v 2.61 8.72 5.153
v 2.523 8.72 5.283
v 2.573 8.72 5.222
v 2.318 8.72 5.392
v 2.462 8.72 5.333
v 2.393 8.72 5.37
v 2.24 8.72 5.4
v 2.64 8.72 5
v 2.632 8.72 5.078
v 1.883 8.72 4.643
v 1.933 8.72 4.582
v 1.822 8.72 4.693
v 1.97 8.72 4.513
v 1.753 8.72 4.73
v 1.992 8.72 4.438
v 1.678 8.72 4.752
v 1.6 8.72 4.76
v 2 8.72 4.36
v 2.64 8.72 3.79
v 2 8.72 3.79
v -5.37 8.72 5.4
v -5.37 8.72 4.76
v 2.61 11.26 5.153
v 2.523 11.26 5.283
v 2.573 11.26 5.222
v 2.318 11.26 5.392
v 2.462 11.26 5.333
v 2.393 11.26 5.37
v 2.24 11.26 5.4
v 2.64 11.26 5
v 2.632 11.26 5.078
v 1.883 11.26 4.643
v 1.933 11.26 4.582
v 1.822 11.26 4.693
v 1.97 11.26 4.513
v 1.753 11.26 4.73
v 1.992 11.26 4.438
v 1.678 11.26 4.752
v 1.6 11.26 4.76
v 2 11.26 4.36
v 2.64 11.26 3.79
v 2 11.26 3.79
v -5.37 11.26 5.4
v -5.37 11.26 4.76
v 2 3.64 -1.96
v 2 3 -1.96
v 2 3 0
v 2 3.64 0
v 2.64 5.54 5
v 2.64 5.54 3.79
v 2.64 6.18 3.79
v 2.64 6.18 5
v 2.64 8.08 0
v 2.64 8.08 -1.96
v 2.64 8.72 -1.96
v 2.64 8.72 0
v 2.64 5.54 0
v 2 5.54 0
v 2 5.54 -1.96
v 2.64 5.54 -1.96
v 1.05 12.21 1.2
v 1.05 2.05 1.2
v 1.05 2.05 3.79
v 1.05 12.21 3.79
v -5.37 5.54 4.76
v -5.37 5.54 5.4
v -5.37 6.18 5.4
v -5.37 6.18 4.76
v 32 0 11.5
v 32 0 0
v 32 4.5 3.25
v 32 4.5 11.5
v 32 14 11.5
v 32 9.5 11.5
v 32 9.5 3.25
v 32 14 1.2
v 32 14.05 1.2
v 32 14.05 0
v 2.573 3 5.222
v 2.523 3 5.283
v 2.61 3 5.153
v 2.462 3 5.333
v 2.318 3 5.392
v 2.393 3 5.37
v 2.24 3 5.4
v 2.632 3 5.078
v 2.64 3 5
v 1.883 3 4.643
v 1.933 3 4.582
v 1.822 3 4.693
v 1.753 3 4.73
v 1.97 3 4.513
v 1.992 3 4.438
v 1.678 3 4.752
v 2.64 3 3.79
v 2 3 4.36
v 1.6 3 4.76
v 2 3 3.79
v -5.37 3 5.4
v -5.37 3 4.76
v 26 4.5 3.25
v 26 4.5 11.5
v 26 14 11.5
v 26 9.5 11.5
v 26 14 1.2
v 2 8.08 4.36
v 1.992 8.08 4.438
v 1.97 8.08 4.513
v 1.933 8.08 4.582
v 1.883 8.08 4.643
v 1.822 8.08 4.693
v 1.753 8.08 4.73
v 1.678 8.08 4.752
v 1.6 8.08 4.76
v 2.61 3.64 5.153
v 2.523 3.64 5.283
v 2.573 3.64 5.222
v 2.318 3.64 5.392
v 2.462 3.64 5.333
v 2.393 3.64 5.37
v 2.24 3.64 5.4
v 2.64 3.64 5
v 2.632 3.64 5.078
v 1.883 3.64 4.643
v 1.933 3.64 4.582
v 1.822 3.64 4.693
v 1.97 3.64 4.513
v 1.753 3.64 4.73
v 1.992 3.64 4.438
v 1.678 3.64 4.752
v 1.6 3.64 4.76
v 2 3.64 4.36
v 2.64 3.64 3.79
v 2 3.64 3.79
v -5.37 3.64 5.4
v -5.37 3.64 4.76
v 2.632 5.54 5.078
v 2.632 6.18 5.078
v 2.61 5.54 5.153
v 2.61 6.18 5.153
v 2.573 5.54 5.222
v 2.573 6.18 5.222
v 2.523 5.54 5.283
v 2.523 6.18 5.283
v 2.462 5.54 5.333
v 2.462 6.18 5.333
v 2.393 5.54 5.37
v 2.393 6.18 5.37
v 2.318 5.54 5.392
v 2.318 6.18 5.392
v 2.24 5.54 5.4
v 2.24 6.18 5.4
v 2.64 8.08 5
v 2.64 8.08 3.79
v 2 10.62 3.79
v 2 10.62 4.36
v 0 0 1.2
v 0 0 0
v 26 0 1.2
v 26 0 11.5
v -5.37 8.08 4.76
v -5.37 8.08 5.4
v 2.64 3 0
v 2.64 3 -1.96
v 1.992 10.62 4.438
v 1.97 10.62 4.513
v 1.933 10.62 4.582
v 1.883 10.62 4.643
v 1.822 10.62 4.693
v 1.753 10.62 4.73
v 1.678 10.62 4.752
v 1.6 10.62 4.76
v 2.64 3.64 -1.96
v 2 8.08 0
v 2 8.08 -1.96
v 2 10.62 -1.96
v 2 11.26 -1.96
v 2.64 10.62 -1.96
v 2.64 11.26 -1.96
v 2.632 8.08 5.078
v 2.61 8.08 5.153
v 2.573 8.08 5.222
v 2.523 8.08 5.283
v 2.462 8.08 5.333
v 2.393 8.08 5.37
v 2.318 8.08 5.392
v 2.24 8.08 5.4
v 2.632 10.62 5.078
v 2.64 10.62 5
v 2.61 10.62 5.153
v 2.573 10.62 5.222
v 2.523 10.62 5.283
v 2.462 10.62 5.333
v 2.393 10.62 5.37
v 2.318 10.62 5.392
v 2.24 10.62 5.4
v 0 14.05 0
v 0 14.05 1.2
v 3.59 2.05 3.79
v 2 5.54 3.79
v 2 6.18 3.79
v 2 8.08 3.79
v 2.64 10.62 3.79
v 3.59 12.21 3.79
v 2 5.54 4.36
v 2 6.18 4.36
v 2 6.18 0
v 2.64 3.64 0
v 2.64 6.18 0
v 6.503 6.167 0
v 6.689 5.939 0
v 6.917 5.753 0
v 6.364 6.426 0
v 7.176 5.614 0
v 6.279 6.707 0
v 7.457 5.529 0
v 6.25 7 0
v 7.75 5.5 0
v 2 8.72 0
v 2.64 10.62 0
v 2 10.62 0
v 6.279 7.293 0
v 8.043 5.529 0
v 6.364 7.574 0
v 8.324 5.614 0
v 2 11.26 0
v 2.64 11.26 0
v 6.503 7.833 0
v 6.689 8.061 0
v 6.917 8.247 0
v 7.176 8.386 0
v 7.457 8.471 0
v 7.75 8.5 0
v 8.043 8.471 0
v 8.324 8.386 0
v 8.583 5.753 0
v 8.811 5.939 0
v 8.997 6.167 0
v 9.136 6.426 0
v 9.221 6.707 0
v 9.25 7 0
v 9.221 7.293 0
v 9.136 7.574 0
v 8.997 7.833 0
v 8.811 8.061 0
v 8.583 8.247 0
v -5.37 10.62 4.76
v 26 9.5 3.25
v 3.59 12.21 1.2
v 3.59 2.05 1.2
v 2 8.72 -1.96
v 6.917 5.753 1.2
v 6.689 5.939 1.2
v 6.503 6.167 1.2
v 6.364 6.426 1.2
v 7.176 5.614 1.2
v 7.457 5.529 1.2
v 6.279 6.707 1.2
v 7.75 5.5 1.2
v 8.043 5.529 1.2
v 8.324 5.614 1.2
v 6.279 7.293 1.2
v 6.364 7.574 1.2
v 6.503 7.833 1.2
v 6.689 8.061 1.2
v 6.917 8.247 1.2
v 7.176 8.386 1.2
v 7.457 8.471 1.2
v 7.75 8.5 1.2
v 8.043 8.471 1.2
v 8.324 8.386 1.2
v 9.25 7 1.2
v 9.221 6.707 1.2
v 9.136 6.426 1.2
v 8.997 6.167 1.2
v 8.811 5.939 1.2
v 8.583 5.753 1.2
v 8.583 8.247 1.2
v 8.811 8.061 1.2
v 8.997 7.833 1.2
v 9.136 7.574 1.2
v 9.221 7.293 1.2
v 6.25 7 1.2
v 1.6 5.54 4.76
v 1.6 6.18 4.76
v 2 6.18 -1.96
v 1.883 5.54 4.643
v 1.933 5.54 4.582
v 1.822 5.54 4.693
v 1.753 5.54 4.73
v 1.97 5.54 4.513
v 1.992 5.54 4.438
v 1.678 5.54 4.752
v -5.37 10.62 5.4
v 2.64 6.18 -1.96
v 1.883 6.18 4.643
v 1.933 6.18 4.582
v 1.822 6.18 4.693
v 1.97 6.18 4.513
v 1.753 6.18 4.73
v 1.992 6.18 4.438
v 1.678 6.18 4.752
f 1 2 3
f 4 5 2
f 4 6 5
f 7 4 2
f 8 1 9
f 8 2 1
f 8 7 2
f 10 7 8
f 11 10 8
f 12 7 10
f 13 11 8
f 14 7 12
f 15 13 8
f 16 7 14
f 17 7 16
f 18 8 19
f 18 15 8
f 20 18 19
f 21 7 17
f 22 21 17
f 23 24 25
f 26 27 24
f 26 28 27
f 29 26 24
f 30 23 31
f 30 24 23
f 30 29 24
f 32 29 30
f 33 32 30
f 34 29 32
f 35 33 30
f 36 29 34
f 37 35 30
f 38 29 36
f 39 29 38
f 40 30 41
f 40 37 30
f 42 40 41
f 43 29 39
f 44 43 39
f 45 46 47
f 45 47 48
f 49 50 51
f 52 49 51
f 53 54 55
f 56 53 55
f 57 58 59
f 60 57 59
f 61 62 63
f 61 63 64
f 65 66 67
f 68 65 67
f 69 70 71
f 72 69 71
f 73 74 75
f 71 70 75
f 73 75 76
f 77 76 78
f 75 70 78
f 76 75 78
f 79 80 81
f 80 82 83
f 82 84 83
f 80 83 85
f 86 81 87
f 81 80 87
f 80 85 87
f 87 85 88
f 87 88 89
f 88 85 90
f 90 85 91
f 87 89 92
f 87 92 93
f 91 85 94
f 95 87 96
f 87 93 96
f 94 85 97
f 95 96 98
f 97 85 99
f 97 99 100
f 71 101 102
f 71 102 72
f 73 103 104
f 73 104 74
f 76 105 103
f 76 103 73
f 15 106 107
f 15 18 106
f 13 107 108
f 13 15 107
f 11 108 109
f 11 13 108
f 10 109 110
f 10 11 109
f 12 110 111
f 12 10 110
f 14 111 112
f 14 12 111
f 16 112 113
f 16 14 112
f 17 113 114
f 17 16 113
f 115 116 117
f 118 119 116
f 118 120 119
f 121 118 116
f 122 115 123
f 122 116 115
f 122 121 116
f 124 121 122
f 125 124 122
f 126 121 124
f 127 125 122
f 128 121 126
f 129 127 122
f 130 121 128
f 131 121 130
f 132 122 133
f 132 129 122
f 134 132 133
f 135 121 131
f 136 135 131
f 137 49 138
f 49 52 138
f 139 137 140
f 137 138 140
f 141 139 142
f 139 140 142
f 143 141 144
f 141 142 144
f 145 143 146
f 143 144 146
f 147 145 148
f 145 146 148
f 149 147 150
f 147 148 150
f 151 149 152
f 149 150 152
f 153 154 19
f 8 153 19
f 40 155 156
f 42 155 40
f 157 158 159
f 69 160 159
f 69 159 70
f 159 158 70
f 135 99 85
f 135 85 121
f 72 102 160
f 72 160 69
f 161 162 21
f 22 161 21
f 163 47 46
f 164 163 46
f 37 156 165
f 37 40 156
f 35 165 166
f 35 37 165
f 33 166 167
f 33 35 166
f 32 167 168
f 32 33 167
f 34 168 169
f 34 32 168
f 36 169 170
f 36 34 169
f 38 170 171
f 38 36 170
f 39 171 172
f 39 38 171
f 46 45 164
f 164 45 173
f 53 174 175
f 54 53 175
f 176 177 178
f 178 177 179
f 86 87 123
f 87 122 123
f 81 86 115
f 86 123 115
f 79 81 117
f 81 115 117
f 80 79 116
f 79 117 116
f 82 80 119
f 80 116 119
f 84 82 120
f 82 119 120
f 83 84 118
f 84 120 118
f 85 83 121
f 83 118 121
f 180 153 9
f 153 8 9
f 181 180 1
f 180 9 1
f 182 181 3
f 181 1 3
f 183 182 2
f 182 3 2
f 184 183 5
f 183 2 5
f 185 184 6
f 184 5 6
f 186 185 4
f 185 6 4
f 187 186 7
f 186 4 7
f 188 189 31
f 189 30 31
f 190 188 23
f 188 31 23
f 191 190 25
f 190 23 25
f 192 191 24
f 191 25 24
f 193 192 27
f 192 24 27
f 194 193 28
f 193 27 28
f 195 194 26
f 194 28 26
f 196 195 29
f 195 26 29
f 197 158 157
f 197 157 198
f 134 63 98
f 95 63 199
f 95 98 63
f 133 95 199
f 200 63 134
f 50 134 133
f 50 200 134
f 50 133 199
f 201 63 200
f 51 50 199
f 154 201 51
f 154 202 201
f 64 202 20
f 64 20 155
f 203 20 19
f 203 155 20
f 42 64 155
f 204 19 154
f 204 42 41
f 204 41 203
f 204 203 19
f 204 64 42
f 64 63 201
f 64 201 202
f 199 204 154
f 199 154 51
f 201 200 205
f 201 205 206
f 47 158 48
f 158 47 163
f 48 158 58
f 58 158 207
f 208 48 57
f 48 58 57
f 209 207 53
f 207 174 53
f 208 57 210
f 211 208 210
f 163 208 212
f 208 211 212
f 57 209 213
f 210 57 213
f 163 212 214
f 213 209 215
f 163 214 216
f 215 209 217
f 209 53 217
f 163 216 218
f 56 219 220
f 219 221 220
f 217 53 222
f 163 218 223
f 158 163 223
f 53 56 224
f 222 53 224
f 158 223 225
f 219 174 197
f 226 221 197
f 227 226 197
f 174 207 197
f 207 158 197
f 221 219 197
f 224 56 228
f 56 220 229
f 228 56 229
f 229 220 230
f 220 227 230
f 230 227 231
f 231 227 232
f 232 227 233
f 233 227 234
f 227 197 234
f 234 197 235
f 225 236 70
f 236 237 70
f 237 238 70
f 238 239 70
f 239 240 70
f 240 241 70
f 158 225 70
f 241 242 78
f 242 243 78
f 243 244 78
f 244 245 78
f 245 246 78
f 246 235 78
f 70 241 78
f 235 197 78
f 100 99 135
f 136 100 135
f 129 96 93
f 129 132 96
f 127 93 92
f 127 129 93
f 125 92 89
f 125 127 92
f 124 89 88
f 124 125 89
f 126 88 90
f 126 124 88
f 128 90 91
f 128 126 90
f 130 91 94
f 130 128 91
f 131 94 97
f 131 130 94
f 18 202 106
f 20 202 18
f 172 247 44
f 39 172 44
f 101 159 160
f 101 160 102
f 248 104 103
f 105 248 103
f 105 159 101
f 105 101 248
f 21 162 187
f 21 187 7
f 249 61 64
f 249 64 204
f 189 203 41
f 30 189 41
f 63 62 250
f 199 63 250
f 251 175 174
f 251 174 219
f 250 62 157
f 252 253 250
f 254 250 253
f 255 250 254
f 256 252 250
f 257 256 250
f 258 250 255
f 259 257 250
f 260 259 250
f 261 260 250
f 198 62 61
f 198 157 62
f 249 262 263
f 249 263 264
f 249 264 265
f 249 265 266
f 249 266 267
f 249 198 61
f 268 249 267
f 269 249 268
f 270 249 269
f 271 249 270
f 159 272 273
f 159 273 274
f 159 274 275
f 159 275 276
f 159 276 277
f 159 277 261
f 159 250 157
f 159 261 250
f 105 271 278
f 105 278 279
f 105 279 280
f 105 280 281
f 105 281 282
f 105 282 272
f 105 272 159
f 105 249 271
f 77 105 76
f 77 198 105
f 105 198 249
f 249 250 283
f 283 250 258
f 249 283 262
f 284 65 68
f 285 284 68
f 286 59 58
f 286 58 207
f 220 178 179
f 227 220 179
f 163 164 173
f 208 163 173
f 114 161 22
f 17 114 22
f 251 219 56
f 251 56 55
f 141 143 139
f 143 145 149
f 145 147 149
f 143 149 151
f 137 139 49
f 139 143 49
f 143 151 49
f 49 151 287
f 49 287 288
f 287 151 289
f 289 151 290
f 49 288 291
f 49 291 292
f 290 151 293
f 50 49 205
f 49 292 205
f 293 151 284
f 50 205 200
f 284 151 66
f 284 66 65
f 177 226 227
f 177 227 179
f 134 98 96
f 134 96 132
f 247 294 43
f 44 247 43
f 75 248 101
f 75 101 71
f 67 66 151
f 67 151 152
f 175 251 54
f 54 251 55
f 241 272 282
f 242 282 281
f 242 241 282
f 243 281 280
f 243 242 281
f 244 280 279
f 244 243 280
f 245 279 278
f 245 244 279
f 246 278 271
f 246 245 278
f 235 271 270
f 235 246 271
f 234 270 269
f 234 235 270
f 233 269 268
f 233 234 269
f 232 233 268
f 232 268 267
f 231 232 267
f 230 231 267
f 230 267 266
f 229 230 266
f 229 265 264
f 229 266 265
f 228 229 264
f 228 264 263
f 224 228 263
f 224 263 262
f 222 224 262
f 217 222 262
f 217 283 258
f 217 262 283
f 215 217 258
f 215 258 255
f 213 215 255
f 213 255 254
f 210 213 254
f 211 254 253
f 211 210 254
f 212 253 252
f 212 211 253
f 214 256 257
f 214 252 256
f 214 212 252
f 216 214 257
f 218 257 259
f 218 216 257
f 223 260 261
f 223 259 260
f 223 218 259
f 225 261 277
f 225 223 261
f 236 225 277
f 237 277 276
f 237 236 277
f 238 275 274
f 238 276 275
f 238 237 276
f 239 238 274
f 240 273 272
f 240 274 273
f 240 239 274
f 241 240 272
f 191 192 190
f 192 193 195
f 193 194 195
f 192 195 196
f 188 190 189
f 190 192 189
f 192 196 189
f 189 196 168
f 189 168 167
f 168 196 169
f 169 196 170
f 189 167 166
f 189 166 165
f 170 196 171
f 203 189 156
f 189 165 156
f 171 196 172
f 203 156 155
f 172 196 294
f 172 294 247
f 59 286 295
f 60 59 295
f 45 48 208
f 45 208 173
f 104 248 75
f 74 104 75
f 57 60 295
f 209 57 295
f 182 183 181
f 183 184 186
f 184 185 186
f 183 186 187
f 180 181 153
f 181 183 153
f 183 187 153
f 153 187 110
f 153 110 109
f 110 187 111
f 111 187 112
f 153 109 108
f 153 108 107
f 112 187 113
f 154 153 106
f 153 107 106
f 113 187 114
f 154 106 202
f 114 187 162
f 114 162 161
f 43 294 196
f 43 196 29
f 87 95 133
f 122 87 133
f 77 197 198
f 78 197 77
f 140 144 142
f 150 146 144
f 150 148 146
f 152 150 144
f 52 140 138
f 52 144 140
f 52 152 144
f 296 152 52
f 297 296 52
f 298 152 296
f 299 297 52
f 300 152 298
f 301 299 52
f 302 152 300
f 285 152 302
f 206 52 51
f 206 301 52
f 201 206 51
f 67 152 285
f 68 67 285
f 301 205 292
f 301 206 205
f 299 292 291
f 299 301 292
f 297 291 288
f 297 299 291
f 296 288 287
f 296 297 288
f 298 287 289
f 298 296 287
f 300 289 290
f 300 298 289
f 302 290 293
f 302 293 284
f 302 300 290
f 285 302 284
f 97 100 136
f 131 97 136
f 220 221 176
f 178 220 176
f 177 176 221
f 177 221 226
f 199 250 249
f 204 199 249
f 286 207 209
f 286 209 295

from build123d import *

# Parameters (mm, degrees)
CYLINDER_R         = 1.5
CYLINDER_DEPTH     = 10
BOX014_W           = 2.54
BOX014_H           = 10
BOX014_DEPTH       = 2.54
BOX013_W           = 2.53
BOX013_H           = 10
BOX013_DEPTH       = 2.53
BOX012_W           = 2.54
BOX012_H           = 10.16
BOX012_DEPTH       = 2.6
BOX011_W           = 0.64
BOX011_H           = 0.64
BOX011_DEPTH       = 9.9
BOX011_PITCH_ANGLE = 90
BOX010_W           = 0.64
BOX010_H           = 0.64
BOX010_DEPTH       = 9.9
BOX009_W           = 0.64
BOX009_H           = 0.64
BOX009_DEPTH       = 9.9
BOX009_PITCH_ANGLE = 90
BOX008_W           = 0.64
BOX008_H           = 0.64
BOX008_DEPTH       = 9.9
BOX007_W           = 0.64
BOX007_H           = 0.64
BOX007_DEPTH       = 9.9
BOX007_PITCH_ANGLE = 90
BOX006_W           = 0.64
BOX006_H           = 0.64
BOX006_DEPTH       = 9.9
BOX005_W           = 0.64
BOX005_H           = 0.64
BOX005_DEPTH       = 9.9
BOX005_PITCH_ANGLE = 90
BOX004_W           = 0.64
BOX004_H           = 0.64
BOX004_DEPTH       = 9.9
FILLET_R           = 0.4
FILLET001_R        = 0.4
FILLET002_R        = 0.4
FILLET003_R        = 0.4
FILLET004_R        = 0.4
FILLET005_R        = 0.4
FILLET006_R        = 0.4
FILLET007_R        = 0.4
BOX003_W           = 6
BOX003_H           = 5
BOX003_DEPTH       = 3.25
BOX002_W           = 6
BOX002_H           = 4.5
BOX002_DEPTH       = 11.5
BOX001_W           = 6
BOX001_H           = 4.5
BOX001_DEPTH       = 11.5
BOX_W              = 32
BOX_H              = 14.05
BOX_DEPTH          = 1.2


with BuildPart() as cylinder:
    # Cylinder → Cylinder (new body)
    with BuildSketch(Plane(origin=(7.75, 7, 0), x_dir=(1, 0, 0), z_dir=(0, 0, 1))):
        Circle(CYLINDER_R)
    extrude(amount=CYLINDER_DEPTH)


with BuildPart() as box014:
    # Box014 → Box014 (new body)
    with BuildSketch(Plane(origin=(-0.5, -1, 0), x_dir=(1, 0, 0), z_dir=(0, 0, 1))):
        with Locations((1.27, 5)):
            Rectangle(BOX014_W, BOX014_H)
    extrude(amount=BOX014_DEPTH)


with BuildPart() as box013:
    # Box013 → Box013 (new body)
    with BuildSketch(Plane(origin=(-9.9, -1, 8.9), x_dir=(1, 0, 0), z_dir=(0, 0, 1))):
        with Locations((1.265, 5)):
            Rectangle(BOX013_W, BOX013_H)
    extrude(amount=BOX013_DEPTH)


with BuildPart() as box012:
    # Box012 → Box012 (new body)
    with BuildSketch(Plane(origin=(-0.95, -0.95, 5.69), x_dir=(1, 0, 0), z_dir=(0, 0, 1))):
        with Locations((1.27, 5.08)):
            Rectangle(BOX012_W, BOX012_H)
    extrude(amount=BOX012_DEPTH)


with BuildPart() as box011:
    # Box011 → Box011 (new body)
    with BuildSketch(Plane.XY):
        with Locations((0.32, 0.32)):
            Rectangle(BOX011_W, BOX011_H)
    extrude(amount=BOX011_DEPTH)


with BuildPart() as box011_1:
    # Box011 pitch: moved
    add(box011.part.rotate(Axis((0, 0, 0), (0, 1, 0)), BOX011_PITCH_ANGLE))


with BuildPart() as box011_2:
    # Box011 placement: moved
    add(box011_1.part.moved(Location((-9.9, 7.62, 9.9))))


with BuildPart() as box010:
    # Box010 → Box010 (new body)
    with BuildSketch(Plane(origin=(0, 7.62, 0), x_dir=(1, 0, 0), z_dir=(0, 0, 1))):
        with Locations((0.32, 0.32)):
            Rectangle(BOX010_W, BOX010_H)
    extrude(amount=BOX010_DEPTH)


with BuildPart() as box009:
    # Box009 → Box009 (new body)
    with BuildSketch(Plane.XY):
        with Locations((0.32, 0.32)):
            Rectangle(BOX009_W, BOX009_H)
    extrude(amount=BOX009_DEPTH)


with BuildPart() as box009_1:
    # Box009 pitch: moved
    add(box009.part.rotate(Axis((0, 0, 0), (0, 1, 0)), BOX009_PITCH_ANGLE))


with BuildPart() as box009_2:
    # Box009 placement: moved
    add(box009_1.part.moved(Location((-9.9, 5.08, 9.9))))


with BuildPart() as box008:
    # Box008 → Box008 (new body)
    with BuildSketch(Plane(origin=(0, 5.08, 0), x_dir=(1, 0, 0), z_dir=(0, 0, 1))):
        with Locations((0.32, 0.32)):
            Rectangle(BOX008_W, BOX008_H)
    extrude(amount=BOX008_DEPTH)


with BuildPart() as box007:
    # Box007 → Box007 (new body)
    with BuildSketch(Plane.XY):
        with Locations((0.32, 0.32)):
            Rectangle(BOX007_W, BOX007_H)
    extrude(amount=BOX007_DEPTH)


with BuildPart() as box007_1:
    # Box007 pitch: moved
    add(box007.part.rotate(Axis((0, 0, 0), (0, 1, 0)), BOX007_PITCH_ANGLE))


with BuildPart() as box007_2:
    # Box007 placement: moved
    add(box007_1.part.moved(Location((-9.9, 2.54, 9.9))))


with BuildPart() as box006:
    # Box006 → Box006 (new body)
    with BuildSketch(Plane(origin=(0, 2.54, 0), x_dir=(1, 0, 0), z_dir=(0, 0, 1))):
        with Locations((0.32, 0.32)):
            Rectangle(BOX006_W, BOX006_H)
    extrude(amount=BOX006_DEPTH)


with BuildPart() as box005:
    # Box005 → Box005 (new body)
    with BuildSketch(Plane.XY):
        with Locations((0.32, 0.32)):
            Rectangle(BOX005_W, BOX005_H)
    extrude(amount=BOX005_DEPTH)


with BuildPart() as box005_1:
    # Box005 pitch: moved
    add(box005.part.rotate(Axis((0, 0, 0), (0, 1, 0)), BOX005_PITCH_ANGLE))


with BuildPart() as box005_2:
    # Box005 placement: moved
    add(box005_1.part.moved(Location((-9.9, 0, 9.9))))


with BuildPart() as cut001:
    # Box004 → Box004 (new body)
    with BuildSketch(Plane.XY):
        with Locations((0.32, 0.32)):
            Rectangle(BOX004_W, BOX004_H)
    extrude(amount=BOX004_DEPTH)

    # Fusion003: union Box005
    add(box005_2.part)

    # Fusion004: union Box006
    add(box006.part)

    # Fusion005: union Box007
    add(box007_2.part)

    # Fusion006: union Box008
    add(box008.part)

    # Fusion007: union Box009
    add(box009_2.part)

    # Fusion008: union Box010
    add(box010.part)

    # Fusion009: union Box011
    add(box011_2.part)

    # Fusion010: union Box012
    add(box012.part)

    # Fillet
    fillet_edges = [cut001.edges().sort_by_distance(p)[0] for p in [
        (0.64, 0.32, 9.9),
    ]]
    fillet(fillet_edges, radius=FILLET_R)

    # Fillet001
    fillet001_edges = [cut001.edges().sort_by_distance(p)[0] for p in [
        (0.64, 2.86, 9.9),
    ]]
    fillet(fillet001_edges, radius=FILLET001_R)

    # Fillet002
    fillet002_edges = [cut001.edges().sort_by_distance(p)[0] for p in [
        (0.64, 5.4, 9.9),
    ]]
    fillet(fillet002_edges, radius=FILLET002_R)

    # Fillet003
    fillet003_edges = [cut001.edges().sort_by_distance(p)[0] for p in [
        (0.64, 7.94, 9.9),
    ]]
    fillet(fillet003_edges, radius=FILLET003_R)

    # Fillet004
    fillet004_edges = [cut001.edges().sort_by_distance(p)[0] for p in [
        (0, 7.94, 9.26),
    ]]
    fillet(fillet004_edges, radius=FILLET004_R)

    # Fillet005
    fillet005_edges = [cut001.edges().sort_by_distance(p)[0] for p in [
        (0, 5.4, 9.26),
    ]]
    fillet(fillet005_edges, radius=FILLET005_R)

    # Fillet006
    fillet006_edges = [cut001.edges().sort_by_distance(p)[0] for p in [
        (0, 2.86, 9.26),
    ]]
    fillet(fillet006_edges, radius=FILLET006_R)

    # Fillet007
    fillet007_edges = [cut001.edges().sort_by_distance(p)[0] for p in [
        (0, 0.32, 9.26),
    ]]
    fillet(fillet007_edges, radius=FILLET007_R)

    # Cut: cut Box013
    add(box013.part, mode=Mode.SUBTRACT)

    # Cut001: cut Box014
    add(box014.part, mode=Mode.SUBTRACT)


with BuildPart() as cut001_1:
    # Cut001 placement: moved
    add(cut001.part.moved(Location((2, 3, -4.5))))


with BuildPart() as box003:
    # Box003 → Box003 (new body)
    with BuildSketch(Plane(origin=(26, 4.5, 0), x_dir=(1, 0, 0), z_dir=(0, 0, 1))):
        with Locations((3, 2.5)):
            Rectangle(BOX003_W, BOX003_H)
    extrude(amount=BOX003_DEPTH)


with BuildPart() as box002:
    # Box002 → Box002 (new body)
    with BuildSketch(Plane(origin=(26, 0, 0), x_dir=(1, 0, 0), z_dir=(0, 0, 1))):
        with Locations((3, 2.25)):
            Rectangle(BOX002_W, BOX002_H)
    extrude(amount=BOX002_DEPTH)


with BuildPart() as box001:
    # Box001 → Box001 (new body)
    with BuildSketch(Plane(origin=(26, 9.5, 0), x_dir=(1, 0, 0), z_dir=(0, 0, 1))):
        with Locations((3, 2.25)):
            Rectangle(BOX001_W, BOX001_H)
    extrude(amount=BOX001_DEPTH)


with BuildPart() as cut002:
    # Box → Box (new body)
    with BuildSketch(Plane.XY):
        with Locations((16, 7.025)):
            Rectangle(BOX_W, BOX_H)
    extrude(amount=BOX_DEPTH)

    # Fusion: union Box001
    add(box001.part)

    # Fusion001: union Box002
    add(box002.part)

    # Fusion002: union Box003
    add(box003.part)

    # Fusion011: union Cut001
    add(cut001_1.part)

    # Cut002: cut Cylinder
    add(cylinder.part, mode=Mode.SUBTRACT)


solid = cut002.part
